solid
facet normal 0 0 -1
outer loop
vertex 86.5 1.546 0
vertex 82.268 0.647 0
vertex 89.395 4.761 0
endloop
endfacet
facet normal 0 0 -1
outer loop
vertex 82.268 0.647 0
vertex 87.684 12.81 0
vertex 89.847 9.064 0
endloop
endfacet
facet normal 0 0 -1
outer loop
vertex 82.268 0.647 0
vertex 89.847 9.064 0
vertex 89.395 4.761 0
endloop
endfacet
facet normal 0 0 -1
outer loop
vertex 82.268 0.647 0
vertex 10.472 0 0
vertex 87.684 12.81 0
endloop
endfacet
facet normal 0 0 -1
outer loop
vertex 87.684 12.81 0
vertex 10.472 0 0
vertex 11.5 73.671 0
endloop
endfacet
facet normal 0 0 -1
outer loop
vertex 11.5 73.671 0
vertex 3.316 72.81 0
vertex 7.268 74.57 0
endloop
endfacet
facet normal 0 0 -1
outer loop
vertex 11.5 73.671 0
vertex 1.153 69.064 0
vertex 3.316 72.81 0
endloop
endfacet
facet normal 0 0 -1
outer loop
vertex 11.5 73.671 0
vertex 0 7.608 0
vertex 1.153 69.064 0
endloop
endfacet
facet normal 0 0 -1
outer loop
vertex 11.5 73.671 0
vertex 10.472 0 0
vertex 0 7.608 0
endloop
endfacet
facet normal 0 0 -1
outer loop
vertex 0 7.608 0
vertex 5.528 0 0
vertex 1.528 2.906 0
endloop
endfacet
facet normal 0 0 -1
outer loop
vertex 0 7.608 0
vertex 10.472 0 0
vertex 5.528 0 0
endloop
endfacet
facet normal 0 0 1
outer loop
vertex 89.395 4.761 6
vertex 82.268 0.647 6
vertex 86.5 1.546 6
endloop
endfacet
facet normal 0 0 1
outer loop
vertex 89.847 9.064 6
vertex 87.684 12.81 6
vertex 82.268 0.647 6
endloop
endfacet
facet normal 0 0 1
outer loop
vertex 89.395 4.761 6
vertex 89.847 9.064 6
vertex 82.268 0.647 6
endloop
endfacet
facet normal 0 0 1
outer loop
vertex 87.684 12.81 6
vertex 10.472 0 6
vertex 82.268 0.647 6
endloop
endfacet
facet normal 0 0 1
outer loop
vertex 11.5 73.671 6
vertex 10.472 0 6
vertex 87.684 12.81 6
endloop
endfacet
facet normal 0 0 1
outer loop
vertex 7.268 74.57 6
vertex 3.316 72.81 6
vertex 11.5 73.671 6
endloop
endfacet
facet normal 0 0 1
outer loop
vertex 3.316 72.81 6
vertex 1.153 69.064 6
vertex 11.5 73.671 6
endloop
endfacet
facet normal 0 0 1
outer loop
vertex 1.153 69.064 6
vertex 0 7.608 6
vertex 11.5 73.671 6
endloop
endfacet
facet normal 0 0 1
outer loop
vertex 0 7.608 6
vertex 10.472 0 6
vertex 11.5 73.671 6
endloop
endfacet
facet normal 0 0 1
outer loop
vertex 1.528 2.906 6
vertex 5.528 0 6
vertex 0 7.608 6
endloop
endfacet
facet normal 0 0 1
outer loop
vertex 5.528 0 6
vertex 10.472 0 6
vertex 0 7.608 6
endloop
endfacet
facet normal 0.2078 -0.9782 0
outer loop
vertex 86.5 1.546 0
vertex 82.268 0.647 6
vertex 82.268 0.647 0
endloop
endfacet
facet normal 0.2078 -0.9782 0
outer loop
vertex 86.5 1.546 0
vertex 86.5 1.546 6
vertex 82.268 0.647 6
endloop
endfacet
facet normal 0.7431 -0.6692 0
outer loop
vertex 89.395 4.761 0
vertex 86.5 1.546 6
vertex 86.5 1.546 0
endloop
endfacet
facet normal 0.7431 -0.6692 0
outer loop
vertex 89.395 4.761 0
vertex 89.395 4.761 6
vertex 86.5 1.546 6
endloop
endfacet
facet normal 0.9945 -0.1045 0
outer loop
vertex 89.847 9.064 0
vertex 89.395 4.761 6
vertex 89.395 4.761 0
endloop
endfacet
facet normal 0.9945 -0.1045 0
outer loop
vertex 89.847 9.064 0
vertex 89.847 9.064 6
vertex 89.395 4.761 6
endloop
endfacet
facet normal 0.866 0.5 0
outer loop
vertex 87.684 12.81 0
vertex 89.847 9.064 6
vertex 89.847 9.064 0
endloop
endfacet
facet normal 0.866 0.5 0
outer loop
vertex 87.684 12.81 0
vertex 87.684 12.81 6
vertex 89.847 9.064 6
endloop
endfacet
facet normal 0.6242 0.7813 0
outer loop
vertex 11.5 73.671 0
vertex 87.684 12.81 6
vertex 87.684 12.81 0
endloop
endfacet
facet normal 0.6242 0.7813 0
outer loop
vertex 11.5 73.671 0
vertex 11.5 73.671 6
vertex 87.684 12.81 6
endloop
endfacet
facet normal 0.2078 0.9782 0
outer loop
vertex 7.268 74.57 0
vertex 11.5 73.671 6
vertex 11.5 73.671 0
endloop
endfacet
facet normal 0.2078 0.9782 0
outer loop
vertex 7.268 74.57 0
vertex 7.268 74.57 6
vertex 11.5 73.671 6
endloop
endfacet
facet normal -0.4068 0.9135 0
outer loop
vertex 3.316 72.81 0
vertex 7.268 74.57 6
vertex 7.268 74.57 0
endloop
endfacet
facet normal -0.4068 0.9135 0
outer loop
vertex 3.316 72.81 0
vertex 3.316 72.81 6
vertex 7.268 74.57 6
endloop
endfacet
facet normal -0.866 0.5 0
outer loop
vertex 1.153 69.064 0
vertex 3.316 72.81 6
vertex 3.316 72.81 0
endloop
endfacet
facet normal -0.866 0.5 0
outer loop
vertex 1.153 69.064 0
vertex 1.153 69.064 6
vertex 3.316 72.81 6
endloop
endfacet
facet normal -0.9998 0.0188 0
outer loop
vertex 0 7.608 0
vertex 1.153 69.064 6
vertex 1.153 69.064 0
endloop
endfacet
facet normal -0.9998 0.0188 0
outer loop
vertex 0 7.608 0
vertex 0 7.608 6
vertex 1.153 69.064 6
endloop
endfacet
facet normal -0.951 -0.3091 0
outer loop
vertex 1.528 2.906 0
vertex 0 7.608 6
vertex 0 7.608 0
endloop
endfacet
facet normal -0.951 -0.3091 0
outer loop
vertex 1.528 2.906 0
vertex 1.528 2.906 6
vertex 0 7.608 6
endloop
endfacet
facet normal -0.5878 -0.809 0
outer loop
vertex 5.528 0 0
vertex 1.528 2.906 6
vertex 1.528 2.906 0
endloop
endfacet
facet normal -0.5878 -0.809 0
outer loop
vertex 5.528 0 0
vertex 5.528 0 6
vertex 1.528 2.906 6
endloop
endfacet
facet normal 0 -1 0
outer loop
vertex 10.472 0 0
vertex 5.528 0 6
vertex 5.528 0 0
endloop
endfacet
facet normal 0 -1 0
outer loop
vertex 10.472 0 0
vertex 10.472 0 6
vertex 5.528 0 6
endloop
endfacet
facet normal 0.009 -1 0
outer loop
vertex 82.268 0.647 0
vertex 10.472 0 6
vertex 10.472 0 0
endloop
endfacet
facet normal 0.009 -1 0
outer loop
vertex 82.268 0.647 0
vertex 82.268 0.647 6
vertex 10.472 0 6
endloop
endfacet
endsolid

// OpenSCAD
$fn = 32;

// ----------------------------------------------------------------------
// Lever arm: two bosses 16 and 14 mm, 75 mm between centres
// ----------------------------------------------------------------------

// --- parameters (mm) ---
profile_height = 6;       // extrusion height
profile_points = 13;      // points of the closed outline

profile = [[0, 7.608], [1.528, 2.906], [5.528, 0], [10.472, 0], [82.268, 0.647], [86.5, 1.546], [89.395, 4.761], [89.847, 9.064], [87.684, 12.81], [11.5, 73.671], [7.268, 74.57], [3.316, 72.81], [1.153, 69.064]];  // single closed polygon, 13 points, counter clockwise

// --- the one profile operation ---
linear_extrude(height = profile_height) polygon(points = profile);
